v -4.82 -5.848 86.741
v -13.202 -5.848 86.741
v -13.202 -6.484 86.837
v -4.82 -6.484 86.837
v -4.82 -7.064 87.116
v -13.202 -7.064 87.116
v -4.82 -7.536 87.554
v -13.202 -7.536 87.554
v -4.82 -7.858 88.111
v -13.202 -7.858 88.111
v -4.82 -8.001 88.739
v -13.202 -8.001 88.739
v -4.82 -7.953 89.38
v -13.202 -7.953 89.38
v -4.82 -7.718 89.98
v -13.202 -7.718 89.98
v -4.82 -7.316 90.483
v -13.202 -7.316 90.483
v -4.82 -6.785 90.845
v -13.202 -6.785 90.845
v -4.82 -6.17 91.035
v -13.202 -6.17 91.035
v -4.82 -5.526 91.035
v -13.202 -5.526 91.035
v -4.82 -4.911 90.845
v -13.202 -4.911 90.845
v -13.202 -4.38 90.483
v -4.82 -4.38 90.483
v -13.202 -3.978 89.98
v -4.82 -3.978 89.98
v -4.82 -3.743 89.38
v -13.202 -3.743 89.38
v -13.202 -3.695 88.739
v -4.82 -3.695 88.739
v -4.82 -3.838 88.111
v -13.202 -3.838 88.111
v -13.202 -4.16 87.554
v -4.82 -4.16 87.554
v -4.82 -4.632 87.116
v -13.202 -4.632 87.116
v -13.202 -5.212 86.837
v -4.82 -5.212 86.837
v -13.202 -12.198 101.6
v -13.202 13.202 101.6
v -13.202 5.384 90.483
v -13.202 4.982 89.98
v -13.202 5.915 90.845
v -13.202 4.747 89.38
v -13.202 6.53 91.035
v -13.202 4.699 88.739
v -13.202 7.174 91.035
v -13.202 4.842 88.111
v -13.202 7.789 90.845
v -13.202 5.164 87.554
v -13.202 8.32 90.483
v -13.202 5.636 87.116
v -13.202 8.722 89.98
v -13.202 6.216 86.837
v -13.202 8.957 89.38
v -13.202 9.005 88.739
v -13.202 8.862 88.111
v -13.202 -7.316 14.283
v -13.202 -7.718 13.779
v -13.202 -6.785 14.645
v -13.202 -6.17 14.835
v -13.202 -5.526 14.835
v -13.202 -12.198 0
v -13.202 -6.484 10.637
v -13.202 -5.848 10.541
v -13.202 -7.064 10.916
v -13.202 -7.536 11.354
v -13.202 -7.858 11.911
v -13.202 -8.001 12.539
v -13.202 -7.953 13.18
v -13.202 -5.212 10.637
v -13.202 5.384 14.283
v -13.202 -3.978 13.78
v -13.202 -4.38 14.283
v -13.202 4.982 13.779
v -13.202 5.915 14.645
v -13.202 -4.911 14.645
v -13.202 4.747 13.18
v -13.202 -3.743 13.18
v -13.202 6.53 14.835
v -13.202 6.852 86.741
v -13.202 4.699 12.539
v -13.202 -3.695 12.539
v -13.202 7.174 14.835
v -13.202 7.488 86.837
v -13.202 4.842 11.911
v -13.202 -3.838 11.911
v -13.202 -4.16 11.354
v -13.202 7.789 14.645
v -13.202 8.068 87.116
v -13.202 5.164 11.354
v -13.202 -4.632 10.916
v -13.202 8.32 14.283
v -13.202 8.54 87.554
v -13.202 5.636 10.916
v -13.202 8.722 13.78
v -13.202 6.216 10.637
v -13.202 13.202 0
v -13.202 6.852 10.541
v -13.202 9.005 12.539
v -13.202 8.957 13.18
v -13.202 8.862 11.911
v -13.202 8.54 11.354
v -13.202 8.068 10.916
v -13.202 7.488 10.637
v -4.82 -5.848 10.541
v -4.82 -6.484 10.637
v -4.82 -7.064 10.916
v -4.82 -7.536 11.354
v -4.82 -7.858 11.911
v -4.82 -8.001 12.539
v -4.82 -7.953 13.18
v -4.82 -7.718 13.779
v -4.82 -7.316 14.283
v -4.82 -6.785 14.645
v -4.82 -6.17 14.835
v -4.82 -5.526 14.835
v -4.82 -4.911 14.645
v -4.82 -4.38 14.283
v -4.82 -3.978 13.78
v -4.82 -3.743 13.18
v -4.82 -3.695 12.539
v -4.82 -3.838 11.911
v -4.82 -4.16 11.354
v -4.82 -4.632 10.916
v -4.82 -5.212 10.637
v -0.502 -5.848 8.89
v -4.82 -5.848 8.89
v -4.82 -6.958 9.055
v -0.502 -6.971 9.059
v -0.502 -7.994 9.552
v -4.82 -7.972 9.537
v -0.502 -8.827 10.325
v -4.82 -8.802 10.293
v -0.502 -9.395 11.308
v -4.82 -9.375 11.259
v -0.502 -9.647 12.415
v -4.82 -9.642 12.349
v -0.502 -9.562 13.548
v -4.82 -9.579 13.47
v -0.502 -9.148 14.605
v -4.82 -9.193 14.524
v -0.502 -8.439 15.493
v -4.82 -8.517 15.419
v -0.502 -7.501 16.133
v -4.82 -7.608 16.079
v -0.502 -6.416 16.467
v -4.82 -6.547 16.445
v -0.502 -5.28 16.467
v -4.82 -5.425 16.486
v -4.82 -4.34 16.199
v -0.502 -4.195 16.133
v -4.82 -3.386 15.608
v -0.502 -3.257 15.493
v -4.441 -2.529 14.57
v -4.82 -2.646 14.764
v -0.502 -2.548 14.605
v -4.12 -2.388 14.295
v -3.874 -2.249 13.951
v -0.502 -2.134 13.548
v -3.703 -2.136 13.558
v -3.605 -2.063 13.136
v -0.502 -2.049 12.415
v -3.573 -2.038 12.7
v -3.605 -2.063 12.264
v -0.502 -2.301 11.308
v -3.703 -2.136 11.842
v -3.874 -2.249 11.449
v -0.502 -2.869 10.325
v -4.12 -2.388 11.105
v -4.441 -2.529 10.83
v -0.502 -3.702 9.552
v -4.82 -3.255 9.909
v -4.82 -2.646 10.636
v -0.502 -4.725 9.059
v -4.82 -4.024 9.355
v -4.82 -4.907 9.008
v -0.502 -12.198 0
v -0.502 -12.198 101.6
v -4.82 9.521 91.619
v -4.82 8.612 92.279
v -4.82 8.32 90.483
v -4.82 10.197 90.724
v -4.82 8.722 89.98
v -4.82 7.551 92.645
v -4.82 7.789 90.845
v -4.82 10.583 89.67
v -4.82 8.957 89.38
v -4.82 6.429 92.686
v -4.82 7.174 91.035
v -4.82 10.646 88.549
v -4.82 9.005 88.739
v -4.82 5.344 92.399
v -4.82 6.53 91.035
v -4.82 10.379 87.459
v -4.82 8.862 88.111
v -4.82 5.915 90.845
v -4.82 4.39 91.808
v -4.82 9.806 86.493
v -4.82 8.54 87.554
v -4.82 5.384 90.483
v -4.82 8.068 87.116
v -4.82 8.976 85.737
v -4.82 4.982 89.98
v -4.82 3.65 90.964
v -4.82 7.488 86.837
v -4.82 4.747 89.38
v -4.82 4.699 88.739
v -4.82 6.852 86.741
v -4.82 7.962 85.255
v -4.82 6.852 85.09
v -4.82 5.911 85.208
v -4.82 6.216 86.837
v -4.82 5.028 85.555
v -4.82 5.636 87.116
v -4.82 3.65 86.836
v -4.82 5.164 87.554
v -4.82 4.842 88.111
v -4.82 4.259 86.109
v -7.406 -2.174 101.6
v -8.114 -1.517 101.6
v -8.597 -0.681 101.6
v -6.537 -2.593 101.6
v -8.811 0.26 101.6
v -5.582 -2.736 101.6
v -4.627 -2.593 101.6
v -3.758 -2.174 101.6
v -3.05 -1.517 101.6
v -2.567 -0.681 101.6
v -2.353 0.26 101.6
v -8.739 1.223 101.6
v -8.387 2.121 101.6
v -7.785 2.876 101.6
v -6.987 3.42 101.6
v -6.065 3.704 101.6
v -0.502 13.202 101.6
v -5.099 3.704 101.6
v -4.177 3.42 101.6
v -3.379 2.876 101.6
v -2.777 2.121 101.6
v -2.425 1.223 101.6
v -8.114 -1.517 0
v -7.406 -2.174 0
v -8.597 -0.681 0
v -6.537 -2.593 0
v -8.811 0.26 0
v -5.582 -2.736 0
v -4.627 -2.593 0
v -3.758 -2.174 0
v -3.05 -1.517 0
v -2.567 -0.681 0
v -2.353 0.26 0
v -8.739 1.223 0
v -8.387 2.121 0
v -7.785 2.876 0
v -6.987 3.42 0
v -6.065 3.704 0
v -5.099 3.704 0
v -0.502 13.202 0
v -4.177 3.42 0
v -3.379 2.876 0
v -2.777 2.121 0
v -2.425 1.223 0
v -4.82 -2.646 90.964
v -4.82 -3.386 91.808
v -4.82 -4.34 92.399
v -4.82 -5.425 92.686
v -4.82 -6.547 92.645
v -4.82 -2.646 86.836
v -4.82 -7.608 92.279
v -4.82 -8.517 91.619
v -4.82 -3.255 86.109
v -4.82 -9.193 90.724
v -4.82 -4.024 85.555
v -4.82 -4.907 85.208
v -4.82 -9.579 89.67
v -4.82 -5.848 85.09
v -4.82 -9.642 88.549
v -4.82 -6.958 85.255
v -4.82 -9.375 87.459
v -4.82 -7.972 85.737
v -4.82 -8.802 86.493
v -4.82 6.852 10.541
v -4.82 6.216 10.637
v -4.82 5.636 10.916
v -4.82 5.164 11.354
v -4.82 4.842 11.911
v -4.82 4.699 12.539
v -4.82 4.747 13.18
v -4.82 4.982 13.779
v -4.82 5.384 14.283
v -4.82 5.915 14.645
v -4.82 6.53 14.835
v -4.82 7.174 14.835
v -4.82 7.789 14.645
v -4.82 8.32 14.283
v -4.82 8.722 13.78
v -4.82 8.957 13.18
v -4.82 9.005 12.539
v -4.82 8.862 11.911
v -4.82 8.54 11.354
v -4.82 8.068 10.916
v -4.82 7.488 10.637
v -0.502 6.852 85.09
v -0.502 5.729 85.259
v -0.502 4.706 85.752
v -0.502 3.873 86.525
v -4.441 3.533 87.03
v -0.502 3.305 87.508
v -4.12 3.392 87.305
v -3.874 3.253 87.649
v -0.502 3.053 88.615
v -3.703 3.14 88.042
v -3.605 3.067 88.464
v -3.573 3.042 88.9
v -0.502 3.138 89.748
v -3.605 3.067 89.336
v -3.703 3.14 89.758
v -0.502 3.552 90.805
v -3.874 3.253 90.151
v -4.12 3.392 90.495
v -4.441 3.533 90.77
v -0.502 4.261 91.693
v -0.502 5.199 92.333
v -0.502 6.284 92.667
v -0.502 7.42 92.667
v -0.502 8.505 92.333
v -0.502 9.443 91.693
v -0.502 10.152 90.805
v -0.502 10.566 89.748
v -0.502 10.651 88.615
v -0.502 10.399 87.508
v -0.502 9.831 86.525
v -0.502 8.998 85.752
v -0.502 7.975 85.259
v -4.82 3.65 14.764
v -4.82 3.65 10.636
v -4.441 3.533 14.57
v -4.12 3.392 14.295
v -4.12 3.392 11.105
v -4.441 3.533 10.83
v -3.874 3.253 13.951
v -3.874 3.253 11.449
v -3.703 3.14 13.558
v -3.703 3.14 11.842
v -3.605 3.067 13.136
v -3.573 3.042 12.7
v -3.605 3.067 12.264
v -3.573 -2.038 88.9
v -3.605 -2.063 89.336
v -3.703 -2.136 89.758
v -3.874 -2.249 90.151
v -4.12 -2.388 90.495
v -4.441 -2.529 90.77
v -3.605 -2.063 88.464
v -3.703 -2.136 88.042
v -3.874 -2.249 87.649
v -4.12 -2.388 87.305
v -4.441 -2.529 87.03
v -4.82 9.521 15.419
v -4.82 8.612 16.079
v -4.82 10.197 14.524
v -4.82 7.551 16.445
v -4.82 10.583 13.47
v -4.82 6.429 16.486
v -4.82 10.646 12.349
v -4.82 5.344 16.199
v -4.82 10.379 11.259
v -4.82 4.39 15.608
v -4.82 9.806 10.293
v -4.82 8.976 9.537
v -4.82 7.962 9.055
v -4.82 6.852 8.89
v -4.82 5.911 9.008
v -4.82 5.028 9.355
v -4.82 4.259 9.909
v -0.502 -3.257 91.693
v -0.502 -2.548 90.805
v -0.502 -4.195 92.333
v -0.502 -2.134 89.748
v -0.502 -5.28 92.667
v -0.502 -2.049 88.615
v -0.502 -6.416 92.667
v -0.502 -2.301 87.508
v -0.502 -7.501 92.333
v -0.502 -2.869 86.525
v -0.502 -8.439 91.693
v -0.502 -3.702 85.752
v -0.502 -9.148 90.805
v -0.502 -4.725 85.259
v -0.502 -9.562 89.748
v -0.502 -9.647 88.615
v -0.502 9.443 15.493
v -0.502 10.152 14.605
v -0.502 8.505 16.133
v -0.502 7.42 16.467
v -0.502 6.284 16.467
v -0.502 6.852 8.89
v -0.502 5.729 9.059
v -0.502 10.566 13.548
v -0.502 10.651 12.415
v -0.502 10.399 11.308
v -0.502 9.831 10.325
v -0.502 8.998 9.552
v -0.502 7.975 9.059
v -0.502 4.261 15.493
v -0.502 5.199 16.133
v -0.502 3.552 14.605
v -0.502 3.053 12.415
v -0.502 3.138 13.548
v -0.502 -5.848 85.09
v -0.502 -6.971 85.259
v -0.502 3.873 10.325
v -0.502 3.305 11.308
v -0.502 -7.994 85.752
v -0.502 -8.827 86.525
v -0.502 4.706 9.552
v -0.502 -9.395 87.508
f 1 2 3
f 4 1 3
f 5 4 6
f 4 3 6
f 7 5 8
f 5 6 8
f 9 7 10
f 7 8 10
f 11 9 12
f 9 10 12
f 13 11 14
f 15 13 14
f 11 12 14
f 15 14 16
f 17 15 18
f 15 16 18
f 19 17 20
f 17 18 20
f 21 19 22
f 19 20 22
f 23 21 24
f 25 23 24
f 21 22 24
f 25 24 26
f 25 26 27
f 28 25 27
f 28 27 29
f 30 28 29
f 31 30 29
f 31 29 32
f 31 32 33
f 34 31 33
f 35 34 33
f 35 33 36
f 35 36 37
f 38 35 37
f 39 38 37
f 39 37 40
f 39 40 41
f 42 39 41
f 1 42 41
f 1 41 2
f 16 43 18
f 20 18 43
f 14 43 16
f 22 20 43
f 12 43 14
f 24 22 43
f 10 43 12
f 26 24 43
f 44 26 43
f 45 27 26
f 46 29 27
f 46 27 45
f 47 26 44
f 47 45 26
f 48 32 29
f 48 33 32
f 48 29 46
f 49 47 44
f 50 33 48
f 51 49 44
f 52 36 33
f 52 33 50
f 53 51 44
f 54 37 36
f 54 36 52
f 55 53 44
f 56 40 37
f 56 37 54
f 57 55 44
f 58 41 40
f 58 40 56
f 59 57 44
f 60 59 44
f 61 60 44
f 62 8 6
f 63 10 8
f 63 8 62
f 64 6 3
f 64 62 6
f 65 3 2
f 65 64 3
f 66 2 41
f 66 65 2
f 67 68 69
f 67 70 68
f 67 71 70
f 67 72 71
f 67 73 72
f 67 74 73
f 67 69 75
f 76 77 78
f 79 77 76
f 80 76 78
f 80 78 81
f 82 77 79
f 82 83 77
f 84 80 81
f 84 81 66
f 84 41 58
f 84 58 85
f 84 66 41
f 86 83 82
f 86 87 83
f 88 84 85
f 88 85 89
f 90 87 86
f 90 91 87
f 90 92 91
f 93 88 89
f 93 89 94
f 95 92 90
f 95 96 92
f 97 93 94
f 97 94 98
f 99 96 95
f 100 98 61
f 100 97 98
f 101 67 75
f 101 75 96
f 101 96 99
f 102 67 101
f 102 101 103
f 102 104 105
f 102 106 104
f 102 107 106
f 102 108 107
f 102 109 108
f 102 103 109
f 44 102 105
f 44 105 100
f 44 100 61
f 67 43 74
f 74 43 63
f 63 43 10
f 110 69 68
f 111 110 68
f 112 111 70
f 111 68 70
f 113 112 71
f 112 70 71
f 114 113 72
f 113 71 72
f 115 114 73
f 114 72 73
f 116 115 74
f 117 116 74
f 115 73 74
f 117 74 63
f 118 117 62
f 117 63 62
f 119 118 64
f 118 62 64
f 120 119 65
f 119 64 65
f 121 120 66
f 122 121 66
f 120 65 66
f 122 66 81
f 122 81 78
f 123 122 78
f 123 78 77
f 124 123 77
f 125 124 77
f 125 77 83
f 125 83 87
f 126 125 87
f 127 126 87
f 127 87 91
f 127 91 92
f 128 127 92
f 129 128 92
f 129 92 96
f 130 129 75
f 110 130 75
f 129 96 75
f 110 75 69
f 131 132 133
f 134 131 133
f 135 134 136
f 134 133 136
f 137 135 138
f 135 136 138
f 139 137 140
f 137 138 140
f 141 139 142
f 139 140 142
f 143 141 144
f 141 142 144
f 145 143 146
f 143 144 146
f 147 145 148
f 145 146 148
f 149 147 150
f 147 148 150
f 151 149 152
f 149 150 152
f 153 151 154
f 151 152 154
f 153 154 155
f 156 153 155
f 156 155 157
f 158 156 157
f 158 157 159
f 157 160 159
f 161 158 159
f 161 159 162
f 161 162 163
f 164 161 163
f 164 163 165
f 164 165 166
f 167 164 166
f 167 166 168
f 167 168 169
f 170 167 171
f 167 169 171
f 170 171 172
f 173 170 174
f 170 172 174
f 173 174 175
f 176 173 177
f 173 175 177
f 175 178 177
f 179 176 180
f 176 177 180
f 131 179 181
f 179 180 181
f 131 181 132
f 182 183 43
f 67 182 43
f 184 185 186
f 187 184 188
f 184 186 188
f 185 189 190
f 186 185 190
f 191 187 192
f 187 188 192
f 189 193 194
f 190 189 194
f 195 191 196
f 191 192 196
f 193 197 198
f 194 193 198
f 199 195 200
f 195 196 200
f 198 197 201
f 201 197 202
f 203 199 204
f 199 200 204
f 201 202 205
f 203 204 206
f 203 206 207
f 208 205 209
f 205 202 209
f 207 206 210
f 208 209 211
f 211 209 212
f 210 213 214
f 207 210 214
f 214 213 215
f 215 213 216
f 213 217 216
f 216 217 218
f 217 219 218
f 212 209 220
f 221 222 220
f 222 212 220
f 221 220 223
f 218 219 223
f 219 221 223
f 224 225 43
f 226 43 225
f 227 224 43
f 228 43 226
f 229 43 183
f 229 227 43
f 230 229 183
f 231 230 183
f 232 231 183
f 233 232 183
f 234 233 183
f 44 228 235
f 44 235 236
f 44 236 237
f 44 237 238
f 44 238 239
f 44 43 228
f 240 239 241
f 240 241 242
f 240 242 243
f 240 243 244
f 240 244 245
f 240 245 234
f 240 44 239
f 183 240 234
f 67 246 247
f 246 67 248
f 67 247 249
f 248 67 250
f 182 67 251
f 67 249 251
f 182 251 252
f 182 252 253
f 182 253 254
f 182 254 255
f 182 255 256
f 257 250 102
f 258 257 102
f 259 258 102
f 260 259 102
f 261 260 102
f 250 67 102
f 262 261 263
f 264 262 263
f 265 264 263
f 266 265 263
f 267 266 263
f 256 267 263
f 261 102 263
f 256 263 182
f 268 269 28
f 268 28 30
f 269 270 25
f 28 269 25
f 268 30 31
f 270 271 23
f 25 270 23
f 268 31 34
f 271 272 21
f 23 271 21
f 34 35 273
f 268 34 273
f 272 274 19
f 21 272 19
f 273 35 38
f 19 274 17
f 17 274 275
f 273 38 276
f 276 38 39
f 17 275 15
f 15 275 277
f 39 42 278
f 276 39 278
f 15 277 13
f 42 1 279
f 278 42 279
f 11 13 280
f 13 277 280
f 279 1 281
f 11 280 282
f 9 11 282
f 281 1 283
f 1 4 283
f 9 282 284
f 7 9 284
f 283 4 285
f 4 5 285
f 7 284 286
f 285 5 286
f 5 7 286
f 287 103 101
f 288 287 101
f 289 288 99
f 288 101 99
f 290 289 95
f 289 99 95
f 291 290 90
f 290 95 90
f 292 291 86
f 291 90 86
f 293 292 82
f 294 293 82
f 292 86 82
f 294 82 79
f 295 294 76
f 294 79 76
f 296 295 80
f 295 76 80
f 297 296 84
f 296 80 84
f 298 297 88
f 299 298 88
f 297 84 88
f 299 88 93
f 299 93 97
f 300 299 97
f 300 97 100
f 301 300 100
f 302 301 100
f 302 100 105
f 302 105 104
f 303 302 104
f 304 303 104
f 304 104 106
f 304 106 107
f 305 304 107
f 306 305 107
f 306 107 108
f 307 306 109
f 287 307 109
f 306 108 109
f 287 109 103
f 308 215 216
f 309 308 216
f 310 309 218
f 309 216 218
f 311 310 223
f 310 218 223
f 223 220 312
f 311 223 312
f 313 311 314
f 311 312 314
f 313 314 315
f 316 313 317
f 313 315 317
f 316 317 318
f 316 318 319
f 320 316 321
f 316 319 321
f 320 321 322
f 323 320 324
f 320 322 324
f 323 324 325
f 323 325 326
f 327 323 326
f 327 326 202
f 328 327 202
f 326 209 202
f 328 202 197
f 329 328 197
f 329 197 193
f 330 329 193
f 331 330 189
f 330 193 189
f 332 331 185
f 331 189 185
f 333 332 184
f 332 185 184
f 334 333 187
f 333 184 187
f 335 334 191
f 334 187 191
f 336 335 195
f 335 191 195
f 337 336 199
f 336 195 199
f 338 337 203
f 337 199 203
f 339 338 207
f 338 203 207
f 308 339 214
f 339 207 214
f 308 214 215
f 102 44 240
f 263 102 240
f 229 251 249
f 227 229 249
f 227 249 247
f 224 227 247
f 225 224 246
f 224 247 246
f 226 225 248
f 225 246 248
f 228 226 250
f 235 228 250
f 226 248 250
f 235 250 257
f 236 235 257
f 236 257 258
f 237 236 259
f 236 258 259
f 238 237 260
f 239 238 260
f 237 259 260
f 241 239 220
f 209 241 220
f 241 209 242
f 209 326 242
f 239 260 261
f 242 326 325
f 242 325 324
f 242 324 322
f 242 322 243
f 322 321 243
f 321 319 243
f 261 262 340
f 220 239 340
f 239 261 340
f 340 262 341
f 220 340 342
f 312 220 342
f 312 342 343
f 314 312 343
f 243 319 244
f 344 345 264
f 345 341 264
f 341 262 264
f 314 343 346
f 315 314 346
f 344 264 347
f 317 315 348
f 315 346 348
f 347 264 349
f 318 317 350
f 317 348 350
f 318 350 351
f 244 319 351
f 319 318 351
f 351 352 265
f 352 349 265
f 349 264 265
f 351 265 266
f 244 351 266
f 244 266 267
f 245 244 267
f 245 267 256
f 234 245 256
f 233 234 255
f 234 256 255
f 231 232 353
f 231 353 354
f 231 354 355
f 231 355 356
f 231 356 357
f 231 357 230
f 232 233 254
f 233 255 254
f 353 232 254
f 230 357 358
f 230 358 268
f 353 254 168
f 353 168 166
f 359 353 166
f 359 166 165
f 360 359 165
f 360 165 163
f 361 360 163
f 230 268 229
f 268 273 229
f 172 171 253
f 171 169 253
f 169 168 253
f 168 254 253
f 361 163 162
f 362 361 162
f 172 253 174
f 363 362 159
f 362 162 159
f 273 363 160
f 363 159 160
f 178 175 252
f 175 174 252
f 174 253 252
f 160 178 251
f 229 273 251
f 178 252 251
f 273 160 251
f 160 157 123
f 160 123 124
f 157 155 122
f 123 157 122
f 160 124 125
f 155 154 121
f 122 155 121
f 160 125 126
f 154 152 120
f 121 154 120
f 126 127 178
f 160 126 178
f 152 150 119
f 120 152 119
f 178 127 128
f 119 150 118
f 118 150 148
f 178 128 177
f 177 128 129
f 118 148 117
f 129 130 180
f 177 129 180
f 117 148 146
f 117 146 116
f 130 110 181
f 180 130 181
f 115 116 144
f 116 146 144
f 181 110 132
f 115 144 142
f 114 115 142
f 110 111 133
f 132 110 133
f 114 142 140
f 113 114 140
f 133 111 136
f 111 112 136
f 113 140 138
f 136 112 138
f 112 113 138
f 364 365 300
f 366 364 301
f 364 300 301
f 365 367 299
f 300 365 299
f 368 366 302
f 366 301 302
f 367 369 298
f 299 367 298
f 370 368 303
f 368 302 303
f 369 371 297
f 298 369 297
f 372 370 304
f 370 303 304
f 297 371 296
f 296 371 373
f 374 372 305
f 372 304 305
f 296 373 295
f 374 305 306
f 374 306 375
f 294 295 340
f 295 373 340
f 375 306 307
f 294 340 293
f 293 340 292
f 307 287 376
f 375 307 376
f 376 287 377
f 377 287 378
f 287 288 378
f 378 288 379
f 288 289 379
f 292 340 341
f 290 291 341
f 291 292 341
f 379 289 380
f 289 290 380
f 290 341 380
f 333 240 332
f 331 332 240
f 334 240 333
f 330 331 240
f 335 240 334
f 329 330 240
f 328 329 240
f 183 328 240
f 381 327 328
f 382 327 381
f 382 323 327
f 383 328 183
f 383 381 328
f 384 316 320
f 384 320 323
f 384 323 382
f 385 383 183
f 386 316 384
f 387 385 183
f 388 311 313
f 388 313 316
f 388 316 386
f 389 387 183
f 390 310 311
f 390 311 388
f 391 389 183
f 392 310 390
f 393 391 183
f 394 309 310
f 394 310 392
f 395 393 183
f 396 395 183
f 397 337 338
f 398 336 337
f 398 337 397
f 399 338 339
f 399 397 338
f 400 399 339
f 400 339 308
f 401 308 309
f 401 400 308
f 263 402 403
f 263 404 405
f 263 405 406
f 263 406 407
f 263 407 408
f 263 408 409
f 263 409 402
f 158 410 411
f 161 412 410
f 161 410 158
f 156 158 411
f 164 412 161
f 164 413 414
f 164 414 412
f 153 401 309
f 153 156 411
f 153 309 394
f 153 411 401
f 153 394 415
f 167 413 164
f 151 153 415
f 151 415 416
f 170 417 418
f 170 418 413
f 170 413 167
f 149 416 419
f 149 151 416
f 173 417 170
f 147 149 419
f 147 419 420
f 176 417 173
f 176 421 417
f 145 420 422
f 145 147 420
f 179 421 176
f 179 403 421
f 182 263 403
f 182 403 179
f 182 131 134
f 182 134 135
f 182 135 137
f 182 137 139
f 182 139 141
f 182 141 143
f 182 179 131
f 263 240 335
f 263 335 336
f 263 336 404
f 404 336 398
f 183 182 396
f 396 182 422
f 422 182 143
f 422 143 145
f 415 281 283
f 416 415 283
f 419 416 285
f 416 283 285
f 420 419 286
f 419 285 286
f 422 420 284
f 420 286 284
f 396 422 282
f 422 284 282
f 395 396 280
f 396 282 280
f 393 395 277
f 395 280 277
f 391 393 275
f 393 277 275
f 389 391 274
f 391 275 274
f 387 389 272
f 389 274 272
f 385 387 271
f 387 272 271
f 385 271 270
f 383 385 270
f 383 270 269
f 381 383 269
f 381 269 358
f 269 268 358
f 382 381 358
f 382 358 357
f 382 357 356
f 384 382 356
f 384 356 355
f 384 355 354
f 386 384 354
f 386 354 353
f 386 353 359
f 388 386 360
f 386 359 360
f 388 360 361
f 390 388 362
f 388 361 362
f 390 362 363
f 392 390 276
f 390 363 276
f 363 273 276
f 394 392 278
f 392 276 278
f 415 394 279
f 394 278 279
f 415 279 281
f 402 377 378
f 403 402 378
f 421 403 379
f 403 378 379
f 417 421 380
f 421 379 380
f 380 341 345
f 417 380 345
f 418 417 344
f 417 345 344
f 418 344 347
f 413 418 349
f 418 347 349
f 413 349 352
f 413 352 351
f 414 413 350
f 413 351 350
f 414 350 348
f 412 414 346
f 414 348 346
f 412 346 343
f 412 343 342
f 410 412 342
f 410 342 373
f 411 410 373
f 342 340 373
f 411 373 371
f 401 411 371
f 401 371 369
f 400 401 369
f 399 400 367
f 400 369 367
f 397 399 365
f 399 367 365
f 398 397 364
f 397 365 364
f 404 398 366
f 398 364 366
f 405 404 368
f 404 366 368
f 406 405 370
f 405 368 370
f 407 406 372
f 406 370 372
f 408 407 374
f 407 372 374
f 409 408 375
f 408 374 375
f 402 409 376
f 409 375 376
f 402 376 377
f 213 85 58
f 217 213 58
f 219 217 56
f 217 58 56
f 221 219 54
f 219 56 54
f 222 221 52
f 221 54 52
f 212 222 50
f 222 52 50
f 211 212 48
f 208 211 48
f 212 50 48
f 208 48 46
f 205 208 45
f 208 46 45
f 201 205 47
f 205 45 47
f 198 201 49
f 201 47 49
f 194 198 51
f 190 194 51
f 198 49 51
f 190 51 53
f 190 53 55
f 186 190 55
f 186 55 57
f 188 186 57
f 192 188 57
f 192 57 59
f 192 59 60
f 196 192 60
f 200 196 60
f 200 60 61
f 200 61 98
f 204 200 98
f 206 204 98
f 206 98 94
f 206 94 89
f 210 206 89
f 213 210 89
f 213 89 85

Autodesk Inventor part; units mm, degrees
ref_plane "YZ Plane" through (0, 0, 0) normal (1, 0, 0) x (0, 1, 0)
ref_plane "XZ Plane" through (0, 0, 0) normal (0, 1, 0) x (-1, 0, 0)
ref_plane "XY Plane" through (0, 0, 0) normal (0, 0, 1) x (1, 0, 0)
sketch "Sketch1" plane through (0, 0, 0) normal (0, 0, 1) x (1, 0, 0)
  line L0 (-13.202, 13.202) -> (-0.502, 13.202)
  line L1 (-0.502, 13.202) -> (-0.502, -12.198)
  line L2 (-0.502, -12.198) -> (-13.202, -12.198)
  line L3 (-13.202, -12.198) -> (-13.202, 13.202)
  point P0 (0, 0)
  dimension "d0" = 12.7
  dimension "d1" = 25.4
extrude "Extrusion1" add sketch "Sketch1" along normal blind 101.6
sketch "Sketch6" plane through (-0.502, 13.202, 101.6) normal (1, 0, 0) x (0, 0, -1)
  line L0 (101.6, 0) -> (101.6, -25.4) projected
  line L1 (101.6, -25.4) -> (0, -25.4) projected
  line L2 (101.6, 0) -> (101.6, -25.4) projected
  line L3 (101.6, 0) -> (0, 0) projected
  line L4 (0, -25.4) -> (0, 0) projected
  line L5 (0, -25.4) -> (0, 0) projected
  point P0 (101.6, -13.202)
  point P1 (88.9, -6.35)
  point P2 (88.9, -19.05)
  point P3 (101.6, -19.05)
  point P4 (101.6, -6.35)
  point P5 (12.7, -6.35)
  point P6 (12.7, -19.05)
  point P7 (0, -19.05)
  point P8 (0, -6.35)
  dimension "d51" = 12.7
  dimension "d52" = 6.35
  dimension "d53" = 12.7
  dimension "d54" = 6.35
  dimension "d55" = 12.7
  dimension "d56" = 6.35
  dimension "d57" = 12.7
  dimension "d58" = 6.35
sketch "Sketch8" plane through (0, 0, 101.6) normal (0, 0, 1) x (1, 0, 0)
  line L0 (-13.202, 13.202) -> (-13.202, -12.198) projected
  line L1 (-13.202, -12.198) -> (-0.502, -12.198) projected
  point P0 (0, 0)
  point P1 (-5.582, 0.502)
  dimension "d82" = 7.62
  dimension "d84" = 12.7
hole "Hole4" at (-5.582, 0.502, 101.6) direction (0, 0, -1) diameter 6.477 end through all
hole "Hole5" at (-0.502, 6.852, 12.7) at (-0.502, -5.848, 12.7) at (-0.502, 6.852, 88.9) at (-0.502, -5.848, 88.9) direction (-1, 0, 0) diameter 4.318 end through all counterbore diameter 7.62 counterbore depth 4.318
properties part number "BottomOfElevatorFrameTop"
